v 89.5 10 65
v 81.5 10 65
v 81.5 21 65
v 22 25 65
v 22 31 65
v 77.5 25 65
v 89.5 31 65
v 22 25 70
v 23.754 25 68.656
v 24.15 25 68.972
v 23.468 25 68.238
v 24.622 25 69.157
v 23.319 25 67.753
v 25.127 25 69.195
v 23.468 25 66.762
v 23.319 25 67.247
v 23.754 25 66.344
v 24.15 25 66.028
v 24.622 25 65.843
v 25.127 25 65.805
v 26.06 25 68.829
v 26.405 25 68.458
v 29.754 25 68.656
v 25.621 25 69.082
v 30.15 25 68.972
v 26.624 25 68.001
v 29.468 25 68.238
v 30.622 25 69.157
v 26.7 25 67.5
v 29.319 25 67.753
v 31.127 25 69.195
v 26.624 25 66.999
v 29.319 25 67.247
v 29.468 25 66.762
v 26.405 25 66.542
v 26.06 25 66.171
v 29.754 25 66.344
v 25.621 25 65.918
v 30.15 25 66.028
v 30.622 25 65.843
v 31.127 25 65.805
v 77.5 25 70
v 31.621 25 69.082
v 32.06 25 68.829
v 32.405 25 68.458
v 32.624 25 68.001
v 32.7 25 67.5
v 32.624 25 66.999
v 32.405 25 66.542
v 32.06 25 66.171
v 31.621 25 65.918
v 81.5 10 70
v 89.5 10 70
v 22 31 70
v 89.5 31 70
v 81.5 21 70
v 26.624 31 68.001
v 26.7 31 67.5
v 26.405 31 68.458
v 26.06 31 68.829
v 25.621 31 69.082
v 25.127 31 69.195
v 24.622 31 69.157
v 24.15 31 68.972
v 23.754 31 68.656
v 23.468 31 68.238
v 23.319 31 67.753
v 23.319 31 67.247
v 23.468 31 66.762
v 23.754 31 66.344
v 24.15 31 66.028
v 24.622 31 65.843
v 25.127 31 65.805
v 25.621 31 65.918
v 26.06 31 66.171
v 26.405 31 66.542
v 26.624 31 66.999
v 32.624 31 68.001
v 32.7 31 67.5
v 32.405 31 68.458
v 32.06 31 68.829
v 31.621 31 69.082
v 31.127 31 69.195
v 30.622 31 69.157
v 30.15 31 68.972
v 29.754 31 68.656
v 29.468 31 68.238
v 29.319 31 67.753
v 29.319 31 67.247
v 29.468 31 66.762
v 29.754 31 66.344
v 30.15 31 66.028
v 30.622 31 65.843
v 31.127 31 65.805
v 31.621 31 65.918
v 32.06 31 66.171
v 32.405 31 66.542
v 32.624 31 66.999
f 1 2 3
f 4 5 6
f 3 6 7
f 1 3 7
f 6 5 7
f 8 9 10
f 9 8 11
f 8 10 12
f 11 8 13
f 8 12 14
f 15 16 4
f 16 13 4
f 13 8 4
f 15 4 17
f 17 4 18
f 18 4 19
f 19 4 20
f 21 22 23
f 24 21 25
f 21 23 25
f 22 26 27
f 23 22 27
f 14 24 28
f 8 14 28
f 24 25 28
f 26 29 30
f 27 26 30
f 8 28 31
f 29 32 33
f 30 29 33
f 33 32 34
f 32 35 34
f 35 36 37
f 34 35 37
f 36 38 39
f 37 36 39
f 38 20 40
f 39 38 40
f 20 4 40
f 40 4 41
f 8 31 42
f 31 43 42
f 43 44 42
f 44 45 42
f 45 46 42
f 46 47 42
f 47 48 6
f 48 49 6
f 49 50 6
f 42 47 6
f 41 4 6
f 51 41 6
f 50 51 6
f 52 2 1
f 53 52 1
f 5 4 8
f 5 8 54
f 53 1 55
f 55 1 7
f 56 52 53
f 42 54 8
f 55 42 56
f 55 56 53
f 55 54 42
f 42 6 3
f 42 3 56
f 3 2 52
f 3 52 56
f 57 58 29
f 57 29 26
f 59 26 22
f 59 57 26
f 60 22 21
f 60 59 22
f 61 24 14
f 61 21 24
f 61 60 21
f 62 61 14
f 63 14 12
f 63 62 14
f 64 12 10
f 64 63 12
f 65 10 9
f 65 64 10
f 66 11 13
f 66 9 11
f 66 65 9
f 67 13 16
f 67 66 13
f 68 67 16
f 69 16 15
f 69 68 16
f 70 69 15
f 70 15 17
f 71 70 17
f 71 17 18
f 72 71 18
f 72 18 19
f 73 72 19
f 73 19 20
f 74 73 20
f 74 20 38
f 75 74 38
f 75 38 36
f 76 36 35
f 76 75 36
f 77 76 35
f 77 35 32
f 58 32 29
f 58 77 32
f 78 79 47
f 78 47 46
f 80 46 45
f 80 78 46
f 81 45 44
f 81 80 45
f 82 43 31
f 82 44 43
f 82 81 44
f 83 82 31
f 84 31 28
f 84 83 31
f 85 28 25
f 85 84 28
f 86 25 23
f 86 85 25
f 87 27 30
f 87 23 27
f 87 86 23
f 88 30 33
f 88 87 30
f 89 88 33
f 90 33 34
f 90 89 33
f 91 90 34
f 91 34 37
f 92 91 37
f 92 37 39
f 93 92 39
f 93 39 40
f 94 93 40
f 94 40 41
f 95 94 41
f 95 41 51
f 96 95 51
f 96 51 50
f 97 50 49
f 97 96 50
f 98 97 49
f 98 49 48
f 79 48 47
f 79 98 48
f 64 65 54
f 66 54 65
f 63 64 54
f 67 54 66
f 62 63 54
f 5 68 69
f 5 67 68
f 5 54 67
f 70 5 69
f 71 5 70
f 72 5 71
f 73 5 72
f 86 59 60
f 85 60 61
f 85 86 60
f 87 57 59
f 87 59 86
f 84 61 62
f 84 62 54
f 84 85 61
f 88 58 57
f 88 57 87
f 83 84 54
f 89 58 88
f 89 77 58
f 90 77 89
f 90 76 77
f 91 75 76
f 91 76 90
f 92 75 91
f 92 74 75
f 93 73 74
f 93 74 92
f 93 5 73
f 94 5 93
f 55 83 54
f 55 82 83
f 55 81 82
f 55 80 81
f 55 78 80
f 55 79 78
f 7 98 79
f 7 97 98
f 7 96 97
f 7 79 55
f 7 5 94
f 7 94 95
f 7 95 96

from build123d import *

# Parameters (mm, degrees)
CYLINDER074_R          = 1.7
CYLINDER074_DEPTH      = 50
CYLINDER074_ROLL_ANGLE = 90
CYLINDER073_R          = 1.7
CYLINDER073_DEPTH      = 50
CYLINDER073_ROLL_ANGLE = 90
BOX038_W               = 8
BOX038_H               = 21
BOX038_DEPTH           = 5
BOX037_W               = 60
BOX037_H               = 6
BOX037_DEPTH           = 5
CHAMFER005_SIZE        = 4


with BuildPart() as filament009:
    # Cylinder074 → Cylinder074 (new body)
    with BuildSketch(Plane.XY):
        Circle(CYLINDER074_R)
    extrude(amount=CYLINDER074_DEPTH)


with BuildPart() as filament009_1:
    # Cylinder074 roll: moved
    add(filament009.part.rotate(Axis((0, 0, 0), (1, 0, 0)), CYLINDER074_ROLL_ANGLE))


with BuildPart() as filament009_2:
    # Cylinder074 placement: moved
    add(filament009_1.part.moved(Location((25, 61, 67.5))))


with BuildPart() as m3_clearance002:
    # Cylinder073 → Cylinder073 (new body)
    with BuildSketch(Plane.XY):
        Circle(CYLINDER073_R)
    extrude(amount=CYLINDER073_DEPTH)


with BuildPart() as m3_clearance002_1:
    # Cylinder073 roll: moved
    add(m3_clearance002.part.rotate(Axis((0, 0, 0), (1, 0, 0)), CYLINDER073_ROLL_ANGLE))


with BuildPart() as m3_clearance002_2:
    # Cylinder073 placement: moved
    add(m3_clearance002_1.part.moved(Location((31, 61, 67.5))))

    # Fusion044: union filament009
    add(filament009_2.part)


with BuildPart() as cube035:
    # Box038 → Box038 (new body)
    with BuildSketch(Plane(origin=(81.5, 10, 65), x_dir=(1, 0, 0), z_dir=(0, 0, 1))):
        with Locations((4, 10.5)):
            Rectangle(BOX038_W, BOX038_H)
    extrude(amount=BOX038_DEPTH)


with BuildPart() as track_clamp_c:
    # Box037 → Box037 (new body)
    with BuildSketch(Plane(origin=(22, 25, 65), x_dir=(1, 0, 0), z_dir=(0, 0, 1))):
        with Locations((30, 3)):
            Rectangle(BOX037_W, BOX037_H)
    extrude(amount=BOX037_DEPTH)

    # Fusion043: union Cube035
    add(cube035.part)

    # Chamfer005
    chamfer005_edges = [track_clamp_c.edges().sort_by_distance(p)[0] for p in [
        (81.5, 25, 67.5),
    ]]
    chamfer(chamfer005_edges, length=CHAMFER005_SIZE)

    # Cut031: cut M3-clearance002
    add(m3_clearance002_2.part, mode=Mode.SUBTRACT)


solid = track_clamp_c.part
